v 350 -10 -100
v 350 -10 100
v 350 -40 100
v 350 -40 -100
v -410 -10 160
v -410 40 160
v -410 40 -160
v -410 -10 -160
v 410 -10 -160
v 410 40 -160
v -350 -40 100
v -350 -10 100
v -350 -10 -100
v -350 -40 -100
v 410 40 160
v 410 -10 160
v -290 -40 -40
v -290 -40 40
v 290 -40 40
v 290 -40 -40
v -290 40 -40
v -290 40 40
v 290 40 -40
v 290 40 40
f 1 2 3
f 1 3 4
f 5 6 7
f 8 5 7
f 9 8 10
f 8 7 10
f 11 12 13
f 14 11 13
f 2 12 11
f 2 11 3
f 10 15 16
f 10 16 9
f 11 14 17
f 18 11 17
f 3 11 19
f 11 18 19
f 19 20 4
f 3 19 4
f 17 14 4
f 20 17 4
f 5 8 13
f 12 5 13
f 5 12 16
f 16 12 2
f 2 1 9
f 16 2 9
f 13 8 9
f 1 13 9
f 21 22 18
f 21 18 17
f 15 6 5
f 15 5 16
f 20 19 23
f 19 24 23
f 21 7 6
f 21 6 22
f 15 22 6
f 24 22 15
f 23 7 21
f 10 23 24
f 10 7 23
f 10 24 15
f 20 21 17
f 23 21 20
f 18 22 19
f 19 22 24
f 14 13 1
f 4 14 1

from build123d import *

# Parameters (mm, degrees)
BOSS_EXTRUDE1_DEPTH      = 40
BOSS_EXTRUDE1_DEPTH_BACK = 10
SKETCH1_W                = 820
SKETCH1_H                = 320
SKETCH1_W_2              = 580
SKETCH1_H_2              = 80
SKETCH1_4_W              = 700
SKETCH1_4_H              = 200
SKETCH1_4_W_2            = 580
SKETCH1_4_H_2            = 80
BOSS_EXTRUDE2_DEPTH      = 40


with BuildPart() as part:
    # Sketch1 → Boss-Extrude1 (new, two sides: drawn at the far end of the back side and taken through both)
    with BuildSketch(Plane(origin=(0, 0, 0), x_dir=(1, 0, 0), z_dir=(0, 1, 0)).offset(-BOSS_EXTRUDE1_DEPTH_BACK)):
        Rectangle(SKETCH1_W, SKETCH1_H)
        Rectangle(SKETCH1_W_2, SKETCH1_H_2, mode=Mode.SUBTRACT)
    extrude(amount=BOSS_EXTRUDE1_DEPTH + BOSS_EXTRUDE1_DEPTH_BACK)

    # Sketch1<4> → Boss-Extrude2 (add)
    with BuildSketch(Plane(origin=(0, 0, 0), x_dir=(1, 0, 0), z_dir=(0, 1, 0))):
        Rectangle(SKETCH1_4_W, SKETCH1_4_H)
        Rectangle(SKETCH1_4_W_2, SKETCH1_4_H_2, mode=Mode.SUBTRACT)
    extrude(amount=-BOSS_EXTRUDE2_DEPTH)


solid = part.part
